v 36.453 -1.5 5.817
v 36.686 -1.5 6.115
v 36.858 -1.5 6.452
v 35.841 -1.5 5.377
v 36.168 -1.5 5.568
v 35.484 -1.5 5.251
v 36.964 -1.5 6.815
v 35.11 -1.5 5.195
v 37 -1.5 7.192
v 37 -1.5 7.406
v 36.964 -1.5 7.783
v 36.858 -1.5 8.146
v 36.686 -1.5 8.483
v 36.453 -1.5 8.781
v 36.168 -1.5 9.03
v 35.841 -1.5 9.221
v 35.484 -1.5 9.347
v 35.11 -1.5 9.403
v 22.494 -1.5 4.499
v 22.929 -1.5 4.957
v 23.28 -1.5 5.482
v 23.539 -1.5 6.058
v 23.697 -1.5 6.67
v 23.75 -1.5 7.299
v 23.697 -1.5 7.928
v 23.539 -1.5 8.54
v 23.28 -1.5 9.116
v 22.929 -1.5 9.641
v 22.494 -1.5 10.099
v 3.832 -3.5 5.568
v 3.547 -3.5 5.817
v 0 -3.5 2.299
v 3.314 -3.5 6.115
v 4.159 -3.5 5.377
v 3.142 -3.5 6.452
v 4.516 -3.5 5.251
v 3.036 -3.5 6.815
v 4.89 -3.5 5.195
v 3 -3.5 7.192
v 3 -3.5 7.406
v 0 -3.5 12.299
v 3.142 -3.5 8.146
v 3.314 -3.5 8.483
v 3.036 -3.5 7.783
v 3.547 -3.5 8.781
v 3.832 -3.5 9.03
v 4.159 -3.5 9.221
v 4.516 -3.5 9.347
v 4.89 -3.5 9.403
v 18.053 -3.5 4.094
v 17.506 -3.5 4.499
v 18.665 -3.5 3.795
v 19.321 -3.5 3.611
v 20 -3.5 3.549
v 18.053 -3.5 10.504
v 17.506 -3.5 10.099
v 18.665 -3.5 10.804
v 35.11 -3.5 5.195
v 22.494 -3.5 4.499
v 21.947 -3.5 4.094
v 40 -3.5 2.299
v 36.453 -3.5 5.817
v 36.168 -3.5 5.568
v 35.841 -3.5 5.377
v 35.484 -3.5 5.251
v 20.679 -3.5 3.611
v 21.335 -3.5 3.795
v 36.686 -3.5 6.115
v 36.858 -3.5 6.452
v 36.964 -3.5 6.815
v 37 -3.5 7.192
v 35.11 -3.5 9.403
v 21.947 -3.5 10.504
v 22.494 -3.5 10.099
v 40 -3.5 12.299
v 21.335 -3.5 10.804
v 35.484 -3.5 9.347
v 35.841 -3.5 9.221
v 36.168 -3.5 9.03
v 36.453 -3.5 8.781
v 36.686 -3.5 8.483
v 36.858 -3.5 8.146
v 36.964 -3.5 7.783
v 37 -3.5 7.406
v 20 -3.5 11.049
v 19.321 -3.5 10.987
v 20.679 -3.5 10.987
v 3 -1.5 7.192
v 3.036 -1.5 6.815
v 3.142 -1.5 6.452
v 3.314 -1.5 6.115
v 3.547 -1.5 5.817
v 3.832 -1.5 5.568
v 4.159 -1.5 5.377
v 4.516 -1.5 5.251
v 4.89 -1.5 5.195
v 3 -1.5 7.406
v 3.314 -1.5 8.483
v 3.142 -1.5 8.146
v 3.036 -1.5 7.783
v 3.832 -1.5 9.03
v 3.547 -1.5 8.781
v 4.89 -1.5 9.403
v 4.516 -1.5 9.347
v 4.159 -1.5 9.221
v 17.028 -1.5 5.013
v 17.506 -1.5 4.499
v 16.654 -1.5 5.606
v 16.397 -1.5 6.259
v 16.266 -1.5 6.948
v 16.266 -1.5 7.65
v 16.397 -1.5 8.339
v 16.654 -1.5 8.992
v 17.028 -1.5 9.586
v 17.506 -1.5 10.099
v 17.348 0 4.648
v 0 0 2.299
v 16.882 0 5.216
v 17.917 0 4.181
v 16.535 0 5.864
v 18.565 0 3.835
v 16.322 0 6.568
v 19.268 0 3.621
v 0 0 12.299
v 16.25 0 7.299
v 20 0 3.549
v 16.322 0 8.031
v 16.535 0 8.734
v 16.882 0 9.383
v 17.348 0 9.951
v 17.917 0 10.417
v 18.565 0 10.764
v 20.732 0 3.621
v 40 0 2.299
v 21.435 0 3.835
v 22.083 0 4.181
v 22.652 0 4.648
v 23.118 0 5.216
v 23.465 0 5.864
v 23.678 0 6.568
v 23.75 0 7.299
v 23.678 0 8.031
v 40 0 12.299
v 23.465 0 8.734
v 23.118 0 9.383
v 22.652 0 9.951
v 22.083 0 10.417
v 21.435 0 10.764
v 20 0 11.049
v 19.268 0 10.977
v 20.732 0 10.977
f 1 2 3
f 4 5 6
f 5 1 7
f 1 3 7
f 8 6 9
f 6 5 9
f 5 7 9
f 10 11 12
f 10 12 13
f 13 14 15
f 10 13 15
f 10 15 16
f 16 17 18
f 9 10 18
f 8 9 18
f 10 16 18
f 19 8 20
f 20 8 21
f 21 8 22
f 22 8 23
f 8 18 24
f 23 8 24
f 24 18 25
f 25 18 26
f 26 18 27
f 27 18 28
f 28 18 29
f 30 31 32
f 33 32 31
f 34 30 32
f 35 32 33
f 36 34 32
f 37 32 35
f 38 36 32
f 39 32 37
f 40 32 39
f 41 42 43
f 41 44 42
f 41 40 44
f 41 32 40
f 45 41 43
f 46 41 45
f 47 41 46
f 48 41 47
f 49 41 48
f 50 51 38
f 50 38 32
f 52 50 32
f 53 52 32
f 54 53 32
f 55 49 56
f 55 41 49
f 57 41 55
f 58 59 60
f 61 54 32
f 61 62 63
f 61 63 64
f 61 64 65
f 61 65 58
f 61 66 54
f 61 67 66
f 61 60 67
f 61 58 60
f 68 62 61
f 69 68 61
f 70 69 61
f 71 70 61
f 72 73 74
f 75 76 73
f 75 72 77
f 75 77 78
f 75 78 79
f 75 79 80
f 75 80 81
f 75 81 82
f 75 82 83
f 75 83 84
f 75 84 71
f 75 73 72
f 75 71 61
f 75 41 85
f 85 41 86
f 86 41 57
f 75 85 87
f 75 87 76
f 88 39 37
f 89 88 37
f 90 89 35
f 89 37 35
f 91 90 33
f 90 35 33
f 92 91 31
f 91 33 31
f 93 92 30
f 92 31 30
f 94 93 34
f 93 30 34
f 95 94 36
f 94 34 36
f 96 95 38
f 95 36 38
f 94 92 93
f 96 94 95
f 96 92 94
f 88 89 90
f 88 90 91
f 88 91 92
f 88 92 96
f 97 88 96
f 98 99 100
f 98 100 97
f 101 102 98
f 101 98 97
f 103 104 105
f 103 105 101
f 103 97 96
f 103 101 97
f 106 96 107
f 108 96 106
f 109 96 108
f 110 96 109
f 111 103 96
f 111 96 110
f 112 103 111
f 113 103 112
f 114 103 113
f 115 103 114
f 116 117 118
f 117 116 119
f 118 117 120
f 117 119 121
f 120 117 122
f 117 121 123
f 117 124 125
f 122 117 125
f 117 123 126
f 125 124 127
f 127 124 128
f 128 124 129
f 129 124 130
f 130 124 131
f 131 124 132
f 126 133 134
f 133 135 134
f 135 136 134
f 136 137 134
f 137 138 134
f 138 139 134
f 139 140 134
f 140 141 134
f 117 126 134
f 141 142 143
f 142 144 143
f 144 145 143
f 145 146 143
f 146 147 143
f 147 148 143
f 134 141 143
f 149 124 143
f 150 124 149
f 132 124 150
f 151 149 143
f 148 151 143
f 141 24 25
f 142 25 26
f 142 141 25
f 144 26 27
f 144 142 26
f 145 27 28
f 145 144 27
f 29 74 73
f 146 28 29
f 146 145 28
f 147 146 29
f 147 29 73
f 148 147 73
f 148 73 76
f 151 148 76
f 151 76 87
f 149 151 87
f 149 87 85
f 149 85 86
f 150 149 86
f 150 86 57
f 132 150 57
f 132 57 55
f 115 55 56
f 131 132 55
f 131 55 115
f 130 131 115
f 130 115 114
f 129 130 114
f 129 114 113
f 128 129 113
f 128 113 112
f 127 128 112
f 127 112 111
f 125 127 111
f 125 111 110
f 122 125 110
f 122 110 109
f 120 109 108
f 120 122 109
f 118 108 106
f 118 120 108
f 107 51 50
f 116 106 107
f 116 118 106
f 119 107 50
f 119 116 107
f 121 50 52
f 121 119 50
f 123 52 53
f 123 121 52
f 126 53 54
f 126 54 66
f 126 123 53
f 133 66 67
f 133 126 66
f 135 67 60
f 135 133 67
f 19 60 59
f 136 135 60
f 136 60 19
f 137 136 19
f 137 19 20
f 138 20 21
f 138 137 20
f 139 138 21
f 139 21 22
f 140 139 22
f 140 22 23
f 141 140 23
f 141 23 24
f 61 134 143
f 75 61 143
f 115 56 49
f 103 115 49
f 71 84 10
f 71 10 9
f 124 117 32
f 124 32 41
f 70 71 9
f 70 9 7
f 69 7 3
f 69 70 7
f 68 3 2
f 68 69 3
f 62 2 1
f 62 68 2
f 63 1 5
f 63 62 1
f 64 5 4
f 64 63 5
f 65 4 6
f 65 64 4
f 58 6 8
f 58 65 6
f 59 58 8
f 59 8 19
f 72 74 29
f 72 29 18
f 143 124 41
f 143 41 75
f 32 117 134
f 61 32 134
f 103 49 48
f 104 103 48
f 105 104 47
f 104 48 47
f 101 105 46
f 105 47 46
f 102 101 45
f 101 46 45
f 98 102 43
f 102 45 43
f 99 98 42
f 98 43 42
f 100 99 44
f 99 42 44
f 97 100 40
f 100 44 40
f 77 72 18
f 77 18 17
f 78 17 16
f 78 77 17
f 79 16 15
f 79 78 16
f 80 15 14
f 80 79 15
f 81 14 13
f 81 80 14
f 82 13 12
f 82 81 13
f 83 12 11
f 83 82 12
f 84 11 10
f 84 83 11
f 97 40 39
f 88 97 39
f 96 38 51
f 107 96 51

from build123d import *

# Parameters (mm, degrees)
F0_W     = 40
F0_H     = 10
F0_R     = 3.75
F1_DEPTH = 3.5
F3_DEPTH = 2


# Not quite as in the source:
# - a pattern or mirror of a feature is missing from the dataset's text; its kind, count and spacing are read off the source's solid


with BuildPart() as f1:
    # F0 (on Front) → F1 (new body)
    with BuildSketch(Plane.XZ):
        with Locations((20, 7.299159328)):
            Rectangle(F0_W, F0_H)
        with Locations((20, 7.299159328)):
            Circle(F0_R, mode=Mode.SUBTRACT)
    extrude(amount=F1_DEPTH)

    # F2 (on face) → F3 (cut)
    with BuildSketch(Plane.XZ.offset(3.5)):
        with BuildLine():
            ThreePointArc((17.5055060633, 4.499159328), (16.25, 7.299159328), (17.5055060633, 10.099159328))
            Line((17.5055060633, 10.099159328), (4.8898644293, 9.4033881317))
            ThreePointArc((4.8898644293, 9.4033881317), (3.5473694307, 8.7811462961), (3, 7.4064228951))
            Line((3, 7.4064228951), (3, 7.1918957609))
            ThreePointArc((3, 7.1918957609), (3.5473694307, 5.8171723599), (4.8898644293, 5.1949305243))
            Line((4.8898644293, 5.1949305243), (17.5055060633, 4.499159328))
        make_face()
    f3 = extrude(amount=-F3_DEPTH, mode=Mode.SUBTRACT)

    # F3_copies: F3 across plane
    add(f3.mirror(Plane(origin=(20, 0, 0), x_dir=(0, 0, 1), z_dir=(1, 0, 0))), mode=Mode.SUBTRACT)


solid = f1.part
